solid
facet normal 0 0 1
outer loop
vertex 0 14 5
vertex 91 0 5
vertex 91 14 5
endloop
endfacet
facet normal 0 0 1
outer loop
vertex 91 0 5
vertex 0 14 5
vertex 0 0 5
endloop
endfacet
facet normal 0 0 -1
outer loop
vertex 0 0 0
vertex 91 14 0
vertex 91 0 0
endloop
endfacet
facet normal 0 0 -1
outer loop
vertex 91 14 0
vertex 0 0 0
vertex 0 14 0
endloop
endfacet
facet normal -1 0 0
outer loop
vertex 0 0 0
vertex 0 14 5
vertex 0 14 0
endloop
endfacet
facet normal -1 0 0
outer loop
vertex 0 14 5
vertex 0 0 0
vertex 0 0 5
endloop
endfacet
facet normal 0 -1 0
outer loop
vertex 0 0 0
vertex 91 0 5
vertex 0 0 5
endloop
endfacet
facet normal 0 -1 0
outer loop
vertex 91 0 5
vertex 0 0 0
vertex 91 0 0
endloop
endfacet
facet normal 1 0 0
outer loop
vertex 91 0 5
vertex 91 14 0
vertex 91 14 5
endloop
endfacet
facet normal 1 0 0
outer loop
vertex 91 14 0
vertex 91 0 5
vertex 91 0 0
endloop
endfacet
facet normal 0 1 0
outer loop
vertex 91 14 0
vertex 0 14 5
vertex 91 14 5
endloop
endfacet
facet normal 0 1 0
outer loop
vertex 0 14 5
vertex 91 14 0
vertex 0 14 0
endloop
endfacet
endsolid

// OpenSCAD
translate([3.5, 5.5, 2.5]) color([0.1901317713313112, 0.08011594570868696, 0.8699478397109702]) cube([7, 11, 5], center=true);
translate([10.5, 5.5, 2.5]) color([0.3457472114844995, 0.837290862214726, 0.25127706432840136]) cube([7, 11, 5], center=true);
translate([17.5, 5.5, 2.5]) color([0.7290260027021367, 0.3013213449137814, 0.5169005458056509]) cube([7, 11, 5], center=true);
translate([24.5, 5.5, 2.5]) color([0.38467176448284957, 0.4820846642847386, 0.8719757028853922]) cube([7, 11, 5], center=true);
translate([31.5, 5.5, 2.5]) color([0.2399620044566907, 0.3058147052987177, 0.5519737755681405]) cube([7, 11, 5], center=true);
translate([38.5, 5.5, 2.5]) color([0.009208459116004764, 0.4953005367860557, 0.43819859659275806]) cube([7, 11, 5], center=true);
translate([45.5, 5.5, 2.5]) color([0.9171481192782721, 0.41212019308576986, 0.49358197644734136]) cube([7, 11, 5], center=true);
translate([52.5, 5.5, 2.5]) color([0.44010860560926524, 0.0856157398333921, 0.2411443971002879]) cube([7, 11, 5], center=true);
translate([59.5, 5.5, 2.5]) color([0.8262650576639278, 0.15379567752788093, 0.8842528530898255]) cube([7, 11, 5], center=true);
translate([66.5, 5.5, 2.5]) color([0.2134665283608419, 0.6127566924478359, 0.818008657000479]) cube([7, 11, 5], center=true);
translate([73.5, 5.5, 2.5]) color([0.5590112191053322, 0.8866043301622452, 0.39447102725022787]) cube([7, 11, 5], center=true);
translate([80.5, 5.5, 2.5]) color([0.9589163376419946, 0.24972819156954773, 0.22005049979750413]) cube([7, 11, 5], center=true);
translate([87.5, 5.5, 2.5]) color([0.8404590105346786, 0.2789960200671917, 0.35210354864297055]) cube([7, 11, 5], center=true);
translate([3.5, 12.5, 2.5]) color([0.9946691500756418, 0.10728537706325991, 0.8996256313138141]) cube([7, 3, 5], center=true);
translate([10.5, 12.5, 2.5]) color([0.6100819970747507, 0.7890377134172993, 0.7110679469752405]) cube([7, 3, 5], center=true);
translate([17.5, 12.5, 2.5]) color([0.7774643558396669, 0.5140354678382717, 0.46207744282607]) cube([7, 3, 5], center=true);
translate([24.5, 12.5, 2.5]) color([0.6343562920465169, 0.27254621857246664, 0.016558424522952975]) cube([7, 3, 5], center=true);
translate([31.5, 12.5, 2.5]) color([0.6148716567717017, 0.7119066573597548, 0.17257617960039529]) cube([7, 3, 5], center=true);
translate([38.5, 12.5, 2.5]) color([0.41465974039415787, 0.21806470516739018, 0.8797884787327306]) cube([7, 3, 5], center=true);
translate([45.5, 12.5, 2.5]) color([0.9971497033508181, 0.006439244314443648, 0.5355241113549698]) cube([7, 3, 5], center=true);
translate([52.5, 12.5, 2.5]) color([0.428269623660265, 0.0497703561320445, 0.3846945959716809]) cube([7, 3, 5], center=true);
translate([59.5, 12.5, 2.5]) color([0.27248481749180187, 0.9711494351721061, 0.5646669518865992]) cube([7, 3, 5], center=true);
translate([66.5, 12.5, 2.5]) color([0.22956269737245216, 0.7165492601952248, 0.5466375027642284]) cube([7, 3, 5], center=true);
translate([73.5, 12.5, 2.5]) color([0.2821670936164109, 0.7398695784196249, 0.9015687423954613]) cube([7, 3, 5], center=true);
translate([78.0, 12.5, 2.5]) color([0.06478718309218656, 0.3075184499818515, 0.32730937178137276]) cube([2, 3, 5], center=true);
translate([80.0, 12.5, 2.5]) color([0.373196919474838, 0.48026967262350795, 0.5820603979481933]) cube([2, 3, 5], center=true);
translate([82.0, 12.5, 2.5]) color([0.1372879505883815, 0.015498761483451418, 0.5048497045627587]) cube([2, 3, 5], center=true);
translate([84.0, 12.5, 2.5]) color([0.36698725510709684, 0.6348155217266559, 0.811995686067811]) cube([2, 3, 5], center=true);
translate([86.0, 12.5, 2.5]) color([0.8768405645756486, 0.1552431358080847, 0.1767648869043179]) cube([2, 3, 5], center=true);
translate([88.0, 12.5, 2.5]) color([0.991228648099722, 0.13558077637136434, 0.20650423900368708]) cube([2, 3, 5], center=true);
translate([90.0, 12.5, 2.5]) color([0.9151210693627757, 0.49673738754911745, 0.7672539256192649]) cube([2, 3, 5], center=true);
